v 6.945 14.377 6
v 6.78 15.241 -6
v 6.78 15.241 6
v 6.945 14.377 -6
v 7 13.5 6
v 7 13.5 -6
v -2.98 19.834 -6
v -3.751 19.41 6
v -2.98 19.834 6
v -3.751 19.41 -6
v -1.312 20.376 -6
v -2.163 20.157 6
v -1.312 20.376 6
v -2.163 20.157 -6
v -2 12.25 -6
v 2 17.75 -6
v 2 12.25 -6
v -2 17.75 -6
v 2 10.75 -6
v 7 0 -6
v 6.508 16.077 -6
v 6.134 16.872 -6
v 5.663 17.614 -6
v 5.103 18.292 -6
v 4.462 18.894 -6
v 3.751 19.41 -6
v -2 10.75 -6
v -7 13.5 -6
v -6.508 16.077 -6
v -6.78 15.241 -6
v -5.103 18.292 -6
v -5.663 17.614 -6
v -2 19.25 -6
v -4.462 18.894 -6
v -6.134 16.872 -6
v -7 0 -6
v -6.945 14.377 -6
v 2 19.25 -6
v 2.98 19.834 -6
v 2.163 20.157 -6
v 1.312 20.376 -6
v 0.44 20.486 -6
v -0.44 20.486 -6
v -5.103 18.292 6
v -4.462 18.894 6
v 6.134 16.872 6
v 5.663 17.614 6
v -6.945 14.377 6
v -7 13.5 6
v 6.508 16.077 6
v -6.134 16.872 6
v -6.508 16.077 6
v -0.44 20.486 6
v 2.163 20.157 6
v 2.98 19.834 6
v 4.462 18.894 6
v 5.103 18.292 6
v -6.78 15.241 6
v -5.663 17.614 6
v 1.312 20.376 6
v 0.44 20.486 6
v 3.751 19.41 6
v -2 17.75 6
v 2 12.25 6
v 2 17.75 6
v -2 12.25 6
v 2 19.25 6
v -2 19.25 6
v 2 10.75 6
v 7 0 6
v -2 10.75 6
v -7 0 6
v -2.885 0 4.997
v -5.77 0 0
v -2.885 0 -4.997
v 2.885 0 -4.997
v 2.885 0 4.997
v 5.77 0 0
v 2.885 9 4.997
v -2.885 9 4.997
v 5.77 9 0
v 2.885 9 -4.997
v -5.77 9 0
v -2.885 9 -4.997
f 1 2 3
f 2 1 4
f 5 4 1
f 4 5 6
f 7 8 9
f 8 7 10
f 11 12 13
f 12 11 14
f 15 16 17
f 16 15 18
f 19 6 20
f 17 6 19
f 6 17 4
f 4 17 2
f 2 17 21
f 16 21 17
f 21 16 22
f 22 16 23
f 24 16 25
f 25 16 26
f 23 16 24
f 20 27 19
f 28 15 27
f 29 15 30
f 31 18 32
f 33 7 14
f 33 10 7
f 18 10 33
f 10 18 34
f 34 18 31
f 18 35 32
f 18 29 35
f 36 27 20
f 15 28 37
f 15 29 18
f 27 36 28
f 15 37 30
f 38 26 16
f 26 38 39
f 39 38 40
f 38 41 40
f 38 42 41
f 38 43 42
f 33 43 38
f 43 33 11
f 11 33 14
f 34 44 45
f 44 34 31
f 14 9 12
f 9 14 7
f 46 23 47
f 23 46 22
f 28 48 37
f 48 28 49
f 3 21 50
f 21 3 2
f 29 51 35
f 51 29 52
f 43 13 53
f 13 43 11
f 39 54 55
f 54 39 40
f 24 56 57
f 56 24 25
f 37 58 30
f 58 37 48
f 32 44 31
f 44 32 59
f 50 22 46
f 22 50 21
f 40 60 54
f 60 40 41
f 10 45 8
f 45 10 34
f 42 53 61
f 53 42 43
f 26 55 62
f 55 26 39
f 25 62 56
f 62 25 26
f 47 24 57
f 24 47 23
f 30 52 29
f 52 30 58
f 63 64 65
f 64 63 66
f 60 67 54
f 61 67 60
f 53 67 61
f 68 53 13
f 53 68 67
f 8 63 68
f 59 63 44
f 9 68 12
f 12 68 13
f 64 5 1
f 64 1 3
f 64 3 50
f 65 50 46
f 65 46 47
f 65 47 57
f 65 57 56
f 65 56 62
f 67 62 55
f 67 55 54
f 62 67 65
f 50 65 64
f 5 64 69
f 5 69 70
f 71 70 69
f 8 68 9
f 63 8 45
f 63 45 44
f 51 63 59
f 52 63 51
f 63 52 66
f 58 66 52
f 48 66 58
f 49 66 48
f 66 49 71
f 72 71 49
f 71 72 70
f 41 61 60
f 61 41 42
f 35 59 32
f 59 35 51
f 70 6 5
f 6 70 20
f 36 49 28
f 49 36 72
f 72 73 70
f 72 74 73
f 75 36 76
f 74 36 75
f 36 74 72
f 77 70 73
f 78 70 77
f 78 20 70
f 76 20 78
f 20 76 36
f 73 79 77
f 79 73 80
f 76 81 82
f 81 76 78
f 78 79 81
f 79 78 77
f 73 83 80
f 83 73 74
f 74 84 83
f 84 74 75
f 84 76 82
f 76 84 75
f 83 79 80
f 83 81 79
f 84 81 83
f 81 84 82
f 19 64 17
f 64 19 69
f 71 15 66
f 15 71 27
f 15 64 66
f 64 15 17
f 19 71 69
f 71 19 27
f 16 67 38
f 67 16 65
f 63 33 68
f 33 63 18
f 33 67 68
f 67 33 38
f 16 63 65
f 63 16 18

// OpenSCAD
$fn = 50;


difference() {
	union() {
		translate(v = [0, 13.5000000000, -6.0000000000]) {
			cylinder(h = 12, r = 7.0000000000);
		}
		translate(v = [0, 13.5000000000, -6.0000000000]) {
			cylinder(h = 12, r = 7.0000000000);
		}
		translate(v = [-7.0000000000, 0, -6.0000000000]) {
			cube(size = [14, 13.5000000000, 12]);
		}
	}
	union() {
		translate(v = [0.0000000000, 9, 0]) {
			rotate(a = [0, 0, 0]) {
				difference() {
					union() {
						rotate(a = [90, 0, 0]) {
							linear_extrude(height = 13.5000000000) {
								polygon(points = [[5.7700000000, 0.0000000000], [2.8850000000, 4.9969665798], [-2.8850000000, 4.9969665798], [-5.7700000000, 0.0000000000], [-2.8850000000, -4.9969665798], [2.8850000000, -4.9969665798]]);
							}
						}
					}
					union();
				}
			}
		}
		translate(v = [-2.0000000000, 10.7500000000, -50]) {
			cube(size = [4, 1.5000000000, 100]);
		}
		translate(v = [-2.0000000000, 17.7500000000, -50]) {
			cube(size = [4, 1.5000000000, 100]);
		}
		translate(v = [0.0000000000, 8, 0]) {
			rotate(a = [90, 0, 0]) {
				cylinder(h = 8, r = 3.0000000000);
			}
		}
	}
}
